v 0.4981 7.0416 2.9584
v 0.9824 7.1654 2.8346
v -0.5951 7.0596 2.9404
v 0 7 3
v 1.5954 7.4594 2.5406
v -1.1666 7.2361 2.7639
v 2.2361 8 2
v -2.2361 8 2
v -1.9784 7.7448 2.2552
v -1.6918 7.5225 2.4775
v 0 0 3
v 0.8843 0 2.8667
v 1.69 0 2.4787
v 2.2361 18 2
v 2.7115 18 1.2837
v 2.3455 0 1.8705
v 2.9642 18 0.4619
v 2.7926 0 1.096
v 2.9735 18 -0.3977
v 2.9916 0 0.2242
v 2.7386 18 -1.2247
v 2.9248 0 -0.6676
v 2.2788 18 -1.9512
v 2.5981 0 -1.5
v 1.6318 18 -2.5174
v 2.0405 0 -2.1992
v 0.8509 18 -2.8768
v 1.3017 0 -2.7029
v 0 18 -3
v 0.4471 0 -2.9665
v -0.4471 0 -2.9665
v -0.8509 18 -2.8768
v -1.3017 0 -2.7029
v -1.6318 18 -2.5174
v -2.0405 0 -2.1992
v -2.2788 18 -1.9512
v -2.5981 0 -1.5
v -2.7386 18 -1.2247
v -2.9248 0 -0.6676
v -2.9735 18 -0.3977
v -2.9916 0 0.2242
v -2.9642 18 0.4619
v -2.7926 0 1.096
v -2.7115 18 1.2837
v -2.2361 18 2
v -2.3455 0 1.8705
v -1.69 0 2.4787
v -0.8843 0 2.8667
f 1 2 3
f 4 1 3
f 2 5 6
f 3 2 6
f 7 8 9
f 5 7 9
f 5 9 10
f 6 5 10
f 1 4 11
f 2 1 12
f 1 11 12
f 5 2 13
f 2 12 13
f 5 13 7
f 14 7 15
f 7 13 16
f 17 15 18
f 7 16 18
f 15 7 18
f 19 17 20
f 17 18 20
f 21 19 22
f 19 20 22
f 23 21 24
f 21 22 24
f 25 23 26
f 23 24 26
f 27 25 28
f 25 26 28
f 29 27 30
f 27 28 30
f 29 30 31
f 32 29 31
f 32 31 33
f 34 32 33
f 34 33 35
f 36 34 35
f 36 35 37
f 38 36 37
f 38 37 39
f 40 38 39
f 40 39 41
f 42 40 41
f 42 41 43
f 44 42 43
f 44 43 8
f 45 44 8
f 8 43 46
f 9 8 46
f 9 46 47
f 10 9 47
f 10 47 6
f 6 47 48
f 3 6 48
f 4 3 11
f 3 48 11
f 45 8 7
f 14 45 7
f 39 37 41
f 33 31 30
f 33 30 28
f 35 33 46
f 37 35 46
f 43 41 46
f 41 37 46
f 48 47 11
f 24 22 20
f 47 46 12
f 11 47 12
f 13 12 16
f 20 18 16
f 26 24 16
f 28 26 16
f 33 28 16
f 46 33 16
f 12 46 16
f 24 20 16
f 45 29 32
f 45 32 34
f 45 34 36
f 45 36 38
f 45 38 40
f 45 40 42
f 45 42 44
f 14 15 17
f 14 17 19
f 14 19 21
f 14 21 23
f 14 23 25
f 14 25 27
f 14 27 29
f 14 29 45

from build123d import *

# Parameters (mm, degrees)
SKETCH1_R               = 3
BOSS_EXTRUDE1_DEPTH     = 18
CUT_EXTRUDE1_START      = -10
CUT_EXTRUDE1_DEPTH      = 10
CUT_EXTRUDE2_DEPTH      = 19.493242009
CUT_EXTRUDE2_DEPTH_BACK = 19.493242009


with BuildPart() as part:
    # Sketch1 → Boss-Extrude1 (new body)
    with BuildSketch(Plane(origin=(0, 0, 0), x_dir=(1, 0, 0), z_dir=(0, 1, 0))):
        with Locations(Location((0, 0, 0), (0, 0, 270))):
            Circle(SKETCH1_R)
    extrude(amount=BOSS_EXTRUDE1_DEPTH)

    # Sketch2 → Cut-Extrude1 (cut)
    with BuildSketch(Plane(origin=(0, 18, 0), x_dir=(1, 0, 0), z_dir=(0, 1, 0)).offset(CUT_EXTRUDE1_START)):
        with BuildLine():
            Line((-2.236067977, -2), (2.236067977, -2))
            ThreePointArc((2.236067977, -2), (0, -3), (-2.236067977, -2))
        make_face()
    extrude(amount=CUT_EXTRUDE1_DEPTH, mode=Mode.SUBTRACT)

    # Sketch3 → Cut-Extrude2 (cut, two sides: drawn at the far end of the back side and taken through both)
    with BuildSketch(Plane(origin=(0, 0, 0), x_dir=(0, 0, -1), z_dir=(1, 0, 0)).offset(-CUT_EXTRUDE2_DEPTH_BACK)):
        Polygon((-2, 8), (-3, 7), (-3, 8), align=None)
    extrude(amount=CUT_EXTRUDE2_DEPTH + CUT_EXTRUDE2_DEPTH_BACK, mode=Mode.SUBTRACT)


solid = part.part
